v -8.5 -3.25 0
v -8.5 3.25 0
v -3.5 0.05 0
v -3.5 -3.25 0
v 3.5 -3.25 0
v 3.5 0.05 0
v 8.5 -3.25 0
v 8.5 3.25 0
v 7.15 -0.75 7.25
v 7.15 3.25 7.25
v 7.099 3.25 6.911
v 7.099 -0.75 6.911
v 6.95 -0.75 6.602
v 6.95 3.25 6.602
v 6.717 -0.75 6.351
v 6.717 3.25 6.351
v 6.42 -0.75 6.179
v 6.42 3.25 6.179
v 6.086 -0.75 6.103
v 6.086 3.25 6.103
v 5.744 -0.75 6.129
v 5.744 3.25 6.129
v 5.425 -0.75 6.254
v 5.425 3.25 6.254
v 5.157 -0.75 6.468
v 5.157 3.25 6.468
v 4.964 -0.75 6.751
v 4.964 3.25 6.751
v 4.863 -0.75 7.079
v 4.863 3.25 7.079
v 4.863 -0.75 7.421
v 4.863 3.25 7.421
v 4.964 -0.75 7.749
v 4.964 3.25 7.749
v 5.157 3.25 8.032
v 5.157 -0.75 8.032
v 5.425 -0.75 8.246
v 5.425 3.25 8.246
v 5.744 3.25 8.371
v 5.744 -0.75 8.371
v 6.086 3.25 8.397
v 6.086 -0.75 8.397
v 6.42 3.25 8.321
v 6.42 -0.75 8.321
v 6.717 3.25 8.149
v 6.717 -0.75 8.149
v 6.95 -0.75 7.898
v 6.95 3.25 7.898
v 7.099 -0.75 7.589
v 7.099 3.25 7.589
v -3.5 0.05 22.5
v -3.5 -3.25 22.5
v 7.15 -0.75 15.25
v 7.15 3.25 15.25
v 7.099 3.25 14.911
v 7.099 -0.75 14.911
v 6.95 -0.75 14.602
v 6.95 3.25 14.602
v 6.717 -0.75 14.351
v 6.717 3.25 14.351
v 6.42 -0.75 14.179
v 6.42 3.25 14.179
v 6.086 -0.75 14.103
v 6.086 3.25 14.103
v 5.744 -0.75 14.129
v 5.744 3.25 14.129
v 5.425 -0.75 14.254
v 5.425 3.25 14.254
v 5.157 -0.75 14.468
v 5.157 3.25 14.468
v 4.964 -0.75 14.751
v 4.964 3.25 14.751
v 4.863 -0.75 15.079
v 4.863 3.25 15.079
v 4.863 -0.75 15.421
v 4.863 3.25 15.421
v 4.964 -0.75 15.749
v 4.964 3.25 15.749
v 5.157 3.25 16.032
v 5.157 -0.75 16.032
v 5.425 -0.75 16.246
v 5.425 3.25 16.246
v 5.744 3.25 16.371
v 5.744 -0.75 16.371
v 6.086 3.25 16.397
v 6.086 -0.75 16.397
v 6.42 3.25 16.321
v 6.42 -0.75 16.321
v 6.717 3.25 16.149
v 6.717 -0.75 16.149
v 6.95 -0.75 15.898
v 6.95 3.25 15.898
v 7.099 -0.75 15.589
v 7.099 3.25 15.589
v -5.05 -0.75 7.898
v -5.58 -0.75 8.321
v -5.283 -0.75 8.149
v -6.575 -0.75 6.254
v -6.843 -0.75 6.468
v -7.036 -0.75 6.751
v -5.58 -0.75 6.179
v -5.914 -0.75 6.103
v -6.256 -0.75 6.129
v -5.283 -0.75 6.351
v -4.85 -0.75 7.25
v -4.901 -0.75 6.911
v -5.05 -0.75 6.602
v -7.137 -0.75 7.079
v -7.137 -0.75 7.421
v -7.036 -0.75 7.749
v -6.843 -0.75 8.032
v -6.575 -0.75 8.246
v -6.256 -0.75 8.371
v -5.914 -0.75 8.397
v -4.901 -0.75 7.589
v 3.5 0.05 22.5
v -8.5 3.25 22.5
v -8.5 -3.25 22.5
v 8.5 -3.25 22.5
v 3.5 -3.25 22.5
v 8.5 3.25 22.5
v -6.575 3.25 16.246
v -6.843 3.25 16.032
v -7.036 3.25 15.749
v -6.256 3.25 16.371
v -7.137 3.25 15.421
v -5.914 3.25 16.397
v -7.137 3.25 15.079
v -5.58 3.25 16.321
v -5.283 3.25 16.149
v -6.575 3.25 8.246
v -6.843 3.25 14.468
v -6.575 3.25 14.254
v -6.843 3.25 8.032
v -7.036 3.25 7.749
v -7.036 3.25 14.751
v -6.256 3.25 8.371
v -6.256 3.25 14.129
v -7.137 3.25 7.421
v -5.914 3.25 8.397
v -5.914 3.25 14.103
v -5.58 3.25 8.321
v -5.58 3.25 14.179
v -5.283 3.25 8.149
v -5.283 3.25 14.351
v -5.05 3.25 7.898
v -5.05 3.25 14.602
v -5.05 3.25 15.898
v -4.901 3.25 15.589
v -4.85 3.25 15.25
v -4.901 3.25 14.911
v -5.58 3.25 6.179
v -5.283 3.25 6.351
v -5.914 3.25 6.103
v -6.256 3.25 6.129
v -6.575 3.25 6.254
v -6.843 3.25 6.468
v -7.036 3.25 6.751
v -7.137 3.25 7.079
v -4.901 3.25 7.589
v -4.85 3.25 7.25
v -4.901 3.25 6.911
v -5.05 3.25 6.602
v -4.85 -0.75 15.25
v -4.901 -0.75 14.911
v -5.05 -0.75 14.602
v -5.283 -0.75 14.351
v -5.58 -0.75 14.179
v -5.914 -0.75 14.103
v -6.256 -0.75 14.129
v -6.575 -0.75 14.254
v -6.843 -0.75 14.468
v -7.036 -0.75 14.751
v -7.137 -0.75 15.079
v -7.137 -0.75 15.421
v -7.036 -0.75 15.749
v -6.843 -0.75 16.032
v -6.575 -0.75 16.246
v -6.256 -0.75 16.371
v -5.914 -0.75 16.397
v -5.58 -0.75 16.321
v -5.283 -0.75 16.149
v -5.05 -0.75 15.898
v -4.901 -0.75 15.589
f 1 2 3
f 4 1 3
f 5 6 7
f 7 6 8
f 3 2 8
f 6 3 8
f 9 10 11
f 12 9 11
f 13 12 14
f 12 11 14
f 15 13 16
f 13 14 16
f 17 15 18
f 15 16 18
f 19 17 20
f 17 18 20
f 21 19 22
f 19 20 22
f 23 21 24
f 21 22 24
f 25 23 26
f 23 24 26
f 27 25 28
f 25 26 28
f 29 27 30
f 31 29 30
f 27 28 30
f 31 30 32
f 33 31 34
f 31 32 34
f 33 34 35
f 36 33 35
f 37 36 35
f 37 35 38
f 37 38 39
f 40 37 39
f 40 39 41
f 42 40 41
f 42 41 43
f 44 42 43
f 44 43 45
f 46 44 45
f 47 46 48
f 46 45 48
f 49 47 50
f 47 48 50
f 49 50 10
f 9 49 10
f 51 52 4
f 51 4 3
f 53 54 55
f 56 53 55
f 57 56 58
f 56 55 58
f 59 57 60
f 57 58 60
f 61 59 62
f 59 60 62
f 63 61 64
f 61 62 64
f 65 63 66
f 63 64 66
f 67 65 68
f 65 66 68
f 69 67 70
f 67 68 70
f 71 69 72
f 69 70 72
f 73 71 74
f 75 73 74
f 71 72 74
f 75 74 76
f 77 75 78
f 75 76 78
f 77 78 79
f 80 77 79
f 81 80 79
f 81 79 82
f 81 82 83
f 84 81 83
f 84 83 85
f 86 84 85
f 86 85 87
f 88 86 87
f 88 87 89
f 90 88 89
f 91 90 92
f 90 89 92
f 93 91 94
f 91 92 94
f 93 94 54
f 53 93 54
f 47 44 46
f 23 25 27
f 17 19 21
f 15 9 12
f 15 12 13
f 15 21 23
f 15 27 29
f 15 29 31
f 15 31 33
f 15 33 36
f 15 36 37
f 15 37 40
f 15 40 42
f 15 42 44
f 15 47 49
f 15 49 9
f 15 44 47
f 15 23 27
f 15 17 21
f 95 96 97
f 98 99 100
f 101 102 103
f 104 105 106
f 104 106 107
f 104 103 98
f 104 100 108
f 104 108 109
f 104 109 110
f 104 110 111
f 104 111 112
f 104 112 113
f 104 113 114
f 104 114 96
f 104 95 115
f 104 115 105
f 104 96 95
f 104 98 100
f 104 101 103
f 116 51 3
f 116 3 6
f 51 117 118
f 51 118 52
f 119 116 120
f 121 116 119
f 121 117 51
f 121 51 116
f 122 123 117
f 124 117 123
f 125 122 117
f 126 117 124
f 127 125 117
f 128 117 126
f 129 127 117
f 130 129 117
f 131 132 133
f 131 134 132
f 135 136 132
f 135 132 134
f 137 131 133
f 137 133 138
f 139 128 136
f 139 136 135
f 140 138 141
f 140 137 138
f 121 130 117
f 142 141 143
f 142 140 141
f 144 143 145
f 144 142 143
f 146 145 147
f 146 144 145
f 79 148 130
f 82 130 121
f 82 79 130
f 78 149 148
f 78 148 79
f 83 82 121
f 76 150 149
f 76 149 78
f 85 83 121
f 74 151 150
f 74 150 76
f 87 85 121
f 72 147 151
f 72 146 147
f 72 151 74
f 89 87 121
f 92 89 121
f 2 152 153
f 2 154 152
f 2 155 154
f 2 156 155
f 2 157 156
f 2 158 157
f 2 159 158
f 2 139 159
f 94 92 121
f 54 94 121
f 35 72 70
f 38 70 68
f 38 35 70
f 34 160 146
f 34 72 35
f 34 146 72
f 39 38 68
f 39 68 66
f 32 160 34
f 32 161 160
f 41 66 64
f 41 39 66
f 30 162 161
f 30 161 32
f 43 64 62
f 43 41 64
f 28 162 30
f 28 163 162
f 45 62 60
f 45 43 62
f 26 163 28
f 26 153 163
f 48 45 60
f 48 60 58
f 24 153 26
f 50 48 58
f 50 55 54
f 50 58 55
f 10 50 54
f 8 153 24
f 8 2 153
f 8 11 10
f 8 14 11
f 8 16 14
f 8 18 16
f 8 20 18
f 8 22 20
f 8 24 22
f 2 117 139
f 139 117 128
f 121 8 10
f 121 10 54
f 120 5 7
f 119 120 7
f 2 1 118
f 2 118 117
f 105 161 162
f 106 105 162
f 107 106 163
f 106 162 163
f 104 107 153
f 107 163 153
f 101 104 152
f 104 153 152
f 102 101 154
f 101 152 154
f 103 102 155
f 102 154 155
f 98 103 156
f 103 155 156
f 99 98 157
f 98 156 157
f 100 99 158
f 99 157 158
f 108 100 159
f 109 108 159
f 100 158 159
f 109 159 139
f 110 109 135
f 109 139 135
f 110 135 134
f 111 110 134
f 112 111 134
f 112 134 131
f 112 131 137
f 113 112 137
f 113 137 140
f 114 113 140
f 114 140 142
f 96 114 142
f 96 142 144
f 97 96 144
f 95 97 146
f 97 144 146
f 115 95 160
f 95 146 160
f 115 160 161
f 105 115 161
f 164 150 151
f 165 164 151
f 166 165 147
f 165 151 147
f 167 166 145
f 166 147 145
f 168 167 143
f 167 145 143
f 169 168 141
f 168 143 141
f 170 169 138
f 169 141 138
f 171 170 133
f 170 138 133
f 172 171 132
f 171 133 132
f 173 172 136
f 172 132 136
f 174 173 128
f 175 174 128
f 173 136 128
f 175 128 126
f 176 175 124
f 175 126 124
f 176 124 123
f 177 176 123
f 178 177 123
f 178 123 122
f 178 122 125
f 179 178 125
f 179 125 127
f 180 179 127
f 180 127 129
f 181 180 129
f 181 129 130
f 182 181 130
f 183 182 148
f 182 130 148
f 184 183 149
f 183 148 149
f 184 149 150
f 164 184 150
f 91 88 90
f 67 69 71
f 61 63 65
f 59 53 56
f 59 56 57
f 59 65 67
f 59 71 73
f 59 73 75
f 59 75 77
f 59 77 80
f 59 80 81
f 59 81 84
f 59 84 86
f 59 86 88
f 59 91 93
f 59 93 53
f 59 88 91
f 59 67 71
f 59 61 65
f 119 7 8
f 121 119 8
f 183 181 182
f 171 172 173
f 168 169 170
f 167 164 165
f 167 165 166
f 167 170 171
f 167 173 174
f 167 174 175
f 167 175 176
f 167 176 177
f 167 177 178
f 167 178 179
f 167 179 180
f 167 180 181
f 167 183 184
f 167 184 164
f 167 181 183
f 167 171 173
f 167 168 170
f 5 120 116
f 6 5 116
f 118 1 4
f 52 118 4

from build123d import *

# Parameters (mm, degrees)
SKETCH_1_W          = 17
SKETCH_1_H          = 6.5
EXTRUDE_1_DEPTH     = 22.5
SKETCH_2_W          = 7
SKETCH_2_H          = 3.3
CUT_EXTRUDE_1_DEPTH = 23.5
SKETCH_3_R          = 1.15
CUT_EXTRUDE_2_DEPTH = 4


with BuildPart() as part:
    # 草图1 → 凸台-拉伸1 (new body)
    with BuildSketch(Plane.XY):
        Rectangle(SKETCH_1_W, SKETCH_1_H)
    extrude(amount=EXTRUDE_1_DEPTH)

    # 草图2 → 切除-拉伸1 (cut, through all)
    with BuildSketch(Plane.XY.offset(22.5)):
        with Locations((0, -1.6)):
            Rectangle(SKETCH_2_W, SKETCH_2_H)
    extrude(amount=-CUT_EXTRUDE_1_DEPTH, mode=Mode.SUBTRACT)

    # 草图3 → 切除-拉伸2 (cut)
    with BuildSketch(Plane(origin=(0, 3.25, 0), x_dir=(1, 0, 0), z_dir=(0, 1, 0))):
        with Locations((-6, -7.25)):
            Circle(SKETCH_3_R)
        with Locations((-6, -15.25)):
            Circle(SKETCH_3_R)
        with Locations((6, -15.25)):
            Circle(SKETCH_3_R)
        with Locations((6, -7.25)):
            Circle(SKETCH_3_R)
    extrude(amount=-CUT_EXTRUDE_2_DEPTH, mode=Mode.SUBTRACT)


solid = part.part
